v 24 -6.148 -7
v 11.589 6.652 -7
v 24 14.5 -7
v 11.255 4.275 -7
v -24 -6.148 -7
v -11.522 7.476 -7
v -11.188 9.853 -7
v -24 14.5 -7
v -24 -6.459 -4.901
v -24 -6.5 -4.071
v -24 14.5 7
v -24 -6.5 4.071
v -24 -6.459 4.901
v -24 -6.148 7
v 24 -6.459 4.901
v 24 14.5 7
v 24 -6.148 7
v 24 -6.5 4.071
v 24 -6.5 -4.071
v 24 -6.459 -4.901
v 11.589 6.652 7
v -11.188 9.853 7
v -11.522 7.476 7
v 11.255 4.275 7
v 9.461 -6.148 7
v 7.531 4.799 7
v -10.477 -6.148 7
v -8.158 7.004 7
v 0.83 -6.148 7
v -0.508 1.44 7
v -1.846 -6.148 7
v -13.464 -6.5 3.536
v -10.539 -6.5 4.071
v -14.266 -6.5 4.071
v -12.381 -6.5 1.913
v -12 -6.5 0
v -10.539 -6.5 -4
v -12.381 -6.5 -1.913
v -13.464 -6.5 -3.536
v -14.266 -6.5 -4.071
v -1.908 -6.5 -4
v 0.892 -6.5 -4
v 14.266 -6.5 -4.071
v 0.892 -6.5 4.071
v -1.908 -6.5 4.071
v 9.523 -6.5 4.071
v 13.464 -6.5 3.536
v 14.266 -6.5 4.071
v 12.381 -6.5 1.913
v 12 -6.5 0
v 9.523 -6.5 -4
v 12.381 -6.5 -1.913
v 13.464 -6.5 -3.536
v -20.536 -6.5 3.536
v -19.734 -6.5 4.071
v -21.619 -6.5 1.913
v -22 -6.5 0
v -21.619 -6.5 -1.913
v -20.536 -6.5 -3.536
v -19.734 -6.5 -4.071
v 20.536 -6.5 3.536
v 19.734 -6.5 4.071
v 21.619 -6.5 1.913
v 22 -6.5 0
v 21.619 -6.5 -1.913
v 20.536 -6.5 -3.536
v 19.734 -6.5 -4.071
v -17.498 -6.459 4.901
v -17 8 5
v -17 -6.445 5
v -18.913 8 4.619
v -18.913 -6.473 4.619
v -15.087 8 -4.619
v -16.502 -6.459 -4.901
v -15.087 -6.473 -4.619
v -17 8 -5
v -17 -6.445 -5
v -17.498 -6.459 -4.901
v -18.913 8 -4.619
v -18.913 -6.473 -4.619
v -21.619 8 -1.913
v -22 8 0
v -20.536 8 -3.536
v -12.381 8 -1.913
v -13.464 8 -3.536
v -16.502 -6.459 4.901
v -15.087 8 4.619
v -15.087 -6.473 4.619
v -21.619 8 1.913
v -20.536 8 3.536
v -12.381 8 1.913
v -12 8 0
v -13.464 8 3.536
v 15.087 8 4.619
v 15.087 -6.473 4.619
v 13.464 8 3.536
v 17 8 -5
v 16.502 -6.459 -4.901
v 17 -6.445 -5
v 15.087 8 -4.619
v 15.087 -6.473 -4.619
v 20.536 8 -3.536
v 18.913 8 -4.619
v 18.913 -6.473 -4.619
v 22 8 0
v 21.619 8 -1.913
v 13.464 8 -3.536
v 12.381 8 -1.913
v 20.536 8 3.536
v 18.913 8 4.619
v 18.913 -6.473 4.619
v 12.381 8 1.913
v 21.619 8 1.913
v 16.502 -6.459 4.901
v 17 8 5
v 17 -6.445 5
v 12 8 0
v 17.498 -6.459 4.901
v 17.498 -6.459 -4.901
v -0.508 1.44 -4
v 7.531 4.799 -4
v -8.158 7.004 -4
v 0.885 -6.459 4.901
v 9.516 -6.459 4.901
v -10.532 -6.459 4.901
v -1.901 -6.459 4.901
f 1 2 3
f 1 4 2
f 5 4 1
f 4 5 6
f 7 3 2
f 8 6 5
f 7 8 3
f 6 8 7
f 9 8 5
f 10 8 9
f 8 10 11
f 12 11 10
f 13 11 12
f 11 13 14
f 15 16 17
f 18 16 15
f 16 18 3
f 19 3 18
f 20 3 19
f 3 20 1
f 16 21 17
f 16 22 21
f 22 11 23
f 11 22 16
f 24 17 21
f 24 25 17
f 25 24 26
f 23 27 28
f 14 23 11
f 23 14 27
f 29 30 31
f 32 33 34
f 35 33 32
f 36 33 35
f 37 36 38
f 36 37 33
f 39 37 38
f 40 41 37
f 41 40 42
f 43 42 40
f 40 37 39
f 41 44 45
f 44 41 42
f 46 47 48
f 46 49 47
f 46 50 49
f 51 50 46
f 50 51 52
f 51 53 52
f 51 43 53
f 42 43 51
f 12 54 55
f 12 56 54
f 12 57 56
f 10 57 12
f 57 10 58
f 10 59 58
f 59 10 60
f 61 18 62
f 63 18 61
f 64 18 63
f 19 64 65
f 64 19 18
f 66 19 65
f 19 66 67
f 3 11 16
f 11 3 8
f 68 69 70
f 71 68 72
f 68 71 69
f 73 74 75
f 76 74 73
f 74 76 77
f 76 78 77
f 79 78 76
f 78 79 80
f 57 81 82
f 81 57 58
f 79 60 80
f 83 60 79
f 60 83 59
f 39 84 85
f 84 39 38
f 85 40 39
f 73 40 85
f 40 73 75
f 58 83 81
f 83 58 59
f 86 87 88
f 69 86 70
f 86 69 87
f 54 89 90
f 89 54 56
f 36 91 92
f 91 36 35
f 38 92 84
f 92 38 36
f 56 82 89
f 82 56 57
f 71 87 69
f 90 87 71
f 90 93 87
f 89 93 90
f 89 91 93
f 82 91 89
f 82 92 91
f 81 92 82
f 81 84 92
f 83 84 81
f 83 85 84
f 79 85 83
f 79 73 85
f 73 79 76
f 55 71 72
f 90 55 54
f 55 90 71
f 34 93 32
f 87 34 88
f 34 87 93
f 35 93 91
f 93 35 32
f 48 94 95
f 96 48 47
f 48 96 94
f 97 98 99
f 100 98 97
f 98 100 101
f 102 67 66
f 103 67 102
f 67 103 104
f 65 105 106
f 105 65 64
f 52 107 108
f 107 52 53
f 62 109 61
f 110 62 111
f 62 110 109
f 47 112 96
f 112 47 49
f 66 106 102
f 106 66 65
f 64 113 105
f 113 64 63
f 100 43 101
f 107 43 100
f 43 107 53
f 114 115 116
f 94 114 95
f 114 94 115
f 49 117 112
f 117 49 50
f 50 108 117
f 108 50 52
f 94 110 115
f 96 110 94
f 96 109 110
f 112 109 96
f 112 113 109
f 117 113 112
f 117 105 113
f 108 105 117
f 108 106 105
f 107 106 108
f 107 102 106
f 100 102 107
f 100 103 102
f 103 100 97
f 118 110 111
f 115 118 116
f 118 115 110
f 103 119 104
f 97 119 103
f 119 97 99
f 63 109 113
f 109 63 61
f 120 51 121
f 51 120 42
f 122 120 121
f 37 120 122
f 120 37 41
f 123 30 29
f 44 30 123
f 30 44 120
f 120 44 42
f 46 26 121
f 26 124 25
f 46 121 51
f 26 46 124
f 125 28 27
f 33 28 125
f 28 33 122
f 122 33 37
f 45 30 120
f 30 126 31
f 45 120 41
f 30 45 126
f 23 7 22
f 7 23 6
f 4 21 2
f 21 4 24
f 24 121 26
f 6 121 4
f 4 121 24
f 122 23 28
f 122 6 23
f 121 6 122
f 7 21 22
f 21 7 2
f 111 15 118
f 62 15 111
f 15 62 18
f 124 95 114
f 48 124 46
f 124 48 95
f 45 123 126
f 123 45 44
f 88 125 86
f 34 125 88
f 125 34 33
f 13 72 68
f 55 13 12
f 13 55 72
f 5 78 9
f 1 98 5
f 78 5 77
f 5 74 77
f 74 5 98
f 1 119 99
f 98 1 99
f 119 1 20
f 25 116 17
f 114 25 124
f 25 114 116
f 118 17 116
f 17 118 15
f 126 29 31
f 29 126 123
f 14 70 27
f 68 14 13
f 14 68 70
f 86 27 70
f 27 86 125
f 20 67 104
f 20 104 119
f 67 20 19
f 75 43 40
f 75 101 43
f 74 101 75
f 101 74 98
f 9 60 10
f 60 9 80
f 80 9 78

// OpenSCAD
diameter=10;
height=4;
number=3;
distance=5;
baseline=30; 


module maghole(diameter,height,number,back) {
		translate([0,height*(number-2)/2,0])
        rotate([90,0,0])
         cylinder(r=diameter/2,h=height*(2*number-1),center=true);
    if(back == 1) {
		translate([0,-height*2*(number+1)/2,0])
        rotate([90,0,0])
         cylinder(r=diameter/2,h=height*number,center=true);
    }
}

module smaghole(diameter,height,number,back) {
		translate([0,.15+height*(number-2)/2,0])
        rotate([90,0,0])
         cylinder(r=0.3+diameter/2,h=height*(2*number-1),center=true);
    if(back == 1) {
		translate([0,-(0.15+height*2*(number+1)/2),0])
        rotate([90,0,0])
         cylinder(r=0.3+diameter/2,h=height*number,center=true);
    }
}
module mirror(diameter,height,number,distance,baseline) {
width=diameter+4;
depth=distance+height*number+4;
length=baseline+diameter+8;
mirrorthick = 1.8;
   difference() {
     translate([0,-height,0])
	   cube([width,  // Small dimension
            depth, // Optical path dim
		      length],center=true);
      translate([0,0,2+baseline/2])
             maghole(diameter,height,number,0);
     translate([0,0,-(2+baseline/2)])
             maghole(diameter,height,number,0);
     rotate([-10,0,0])
     translate([-4,0.5+depth/4,-4])
          cube([width+2,depth+2,((length-2*width)/2)-1.5],center=true);
     rotate([10,0,0])
     translate([-4,depth/4,+5])
          cube([width+2,depth+2,((length-2*width)/2)-1.5],center=true);
    rotate([8,0,0])
     translate([0,-depth/3,0.95])
          cube([width+2,mirrorthick+0.6,length-(2*diameter+5)],center=true);
     }
}

module sensor(diameter,height,number,distance,baseline) {
width=diameter+4;
depth=distance+height*number+4;
length=baseline+diameter+8;
mirrorthick = 2.6;
extra=2*width+4;

   difference() {
     translate([2+width/2,-height,0])
	   cube([extra,  // Small dimension
            depth, // Optical path dim
		      length],center=true);
      translate([0,0,2+baseline/2])
             smaghole(diameter,height,number,1);
     translate([0,0,-(2+baseline/2)])
             smaghole(diameter,height,number,1);
//LASER
     translate([0,0,4])
        rotate([90,0,0])
             cylinder(r=3.2,h=40,center=true,$fn=24);
//PhotoTransistor
     translate([0,0,-2])
        rotate([90,0,0])
             cylinder(r=2,h=40,center=true,$fn=12);
// TEMP SENSOR
     translate([2+width,0,0])
        rotate([90,0,0])
             cylinder(r=4.7,h=40,center=true);

     }

     difference() {
     translate([0,-4,-2.5])cube([5,6,5],center=true);
     translate([0,-8,0])
        cylinder(r=3.2,h=10,center=true,$fn=12);
     translate([0,0,-1.2])
        rotate([90,0,0])
             cylinder(r=0.6,h=40,center=true,$fn=6);
     translate([0,0,-2.8])
        rotate([90,0,0])
             cylinder(r=0.6,h=40,center=true,$fn=6);
     }
}

module jarwall() {
  difference() {
     cube([40,40,120],center=true);
	  translate([40,0,0])
	     cylinder(r=50,h=120,center=true,$fn=64);
	   }
}

module jar() {
	  translate([-8,110,-10])
	          cylinder(r=50,h=120,center=true,$fn=64);
}

module powerhole(dim) {
offset = dim+2;
  //  cylinder(r=dim,h=2*dim,center=true,$fn=10);
  //  translate([dim-1.6,0,0])
   //   cylinder(r=dim,h=dim,center=true,$fn=10);
    translate([dim-3,0,0]) cube([2*dim+2,2*dim-1,2*dim-1],center=true);
    translate([-offset,0,0])
      cylinder(r=1.1,h=2*dim,center=true,$fn=10);
    translate([offset+2,0,0])
      cylinder(r=1.1,h=2*dim,center=true,$fn=10);
}

module sensordevice() {
  wall = 32;
  side = 44;
  deep = 50;
  difference() { 
   sensor(diameter,height,number,distance,baseline);
   translate([6,-60,3]) jar();
  }
  translate([-7,-(wall+30),21]) cube([wall,side+12,3]);

     translate([-7,-(wall+30),-24])
         cube([wall,side+12,3]);

  difference() {
  translate([23.5,-(wall+7),0])
    rotate([0,90,0])
    cube([side,deep,3],center=true);
     translate([24,-54,12])
			rotate([0,90,0]) 
           powerhole(4.5);
  }
}
module mirrordevice() {
  difference() { 
   mirror(diameter,height,number,distance,baseline);
   translate([0,-3.3,0]) rotate([0,0,-90]) jarwall();
  }
}

rotate([0,90,180]) 
  // sensordevice();
   mirrordevice();



     
